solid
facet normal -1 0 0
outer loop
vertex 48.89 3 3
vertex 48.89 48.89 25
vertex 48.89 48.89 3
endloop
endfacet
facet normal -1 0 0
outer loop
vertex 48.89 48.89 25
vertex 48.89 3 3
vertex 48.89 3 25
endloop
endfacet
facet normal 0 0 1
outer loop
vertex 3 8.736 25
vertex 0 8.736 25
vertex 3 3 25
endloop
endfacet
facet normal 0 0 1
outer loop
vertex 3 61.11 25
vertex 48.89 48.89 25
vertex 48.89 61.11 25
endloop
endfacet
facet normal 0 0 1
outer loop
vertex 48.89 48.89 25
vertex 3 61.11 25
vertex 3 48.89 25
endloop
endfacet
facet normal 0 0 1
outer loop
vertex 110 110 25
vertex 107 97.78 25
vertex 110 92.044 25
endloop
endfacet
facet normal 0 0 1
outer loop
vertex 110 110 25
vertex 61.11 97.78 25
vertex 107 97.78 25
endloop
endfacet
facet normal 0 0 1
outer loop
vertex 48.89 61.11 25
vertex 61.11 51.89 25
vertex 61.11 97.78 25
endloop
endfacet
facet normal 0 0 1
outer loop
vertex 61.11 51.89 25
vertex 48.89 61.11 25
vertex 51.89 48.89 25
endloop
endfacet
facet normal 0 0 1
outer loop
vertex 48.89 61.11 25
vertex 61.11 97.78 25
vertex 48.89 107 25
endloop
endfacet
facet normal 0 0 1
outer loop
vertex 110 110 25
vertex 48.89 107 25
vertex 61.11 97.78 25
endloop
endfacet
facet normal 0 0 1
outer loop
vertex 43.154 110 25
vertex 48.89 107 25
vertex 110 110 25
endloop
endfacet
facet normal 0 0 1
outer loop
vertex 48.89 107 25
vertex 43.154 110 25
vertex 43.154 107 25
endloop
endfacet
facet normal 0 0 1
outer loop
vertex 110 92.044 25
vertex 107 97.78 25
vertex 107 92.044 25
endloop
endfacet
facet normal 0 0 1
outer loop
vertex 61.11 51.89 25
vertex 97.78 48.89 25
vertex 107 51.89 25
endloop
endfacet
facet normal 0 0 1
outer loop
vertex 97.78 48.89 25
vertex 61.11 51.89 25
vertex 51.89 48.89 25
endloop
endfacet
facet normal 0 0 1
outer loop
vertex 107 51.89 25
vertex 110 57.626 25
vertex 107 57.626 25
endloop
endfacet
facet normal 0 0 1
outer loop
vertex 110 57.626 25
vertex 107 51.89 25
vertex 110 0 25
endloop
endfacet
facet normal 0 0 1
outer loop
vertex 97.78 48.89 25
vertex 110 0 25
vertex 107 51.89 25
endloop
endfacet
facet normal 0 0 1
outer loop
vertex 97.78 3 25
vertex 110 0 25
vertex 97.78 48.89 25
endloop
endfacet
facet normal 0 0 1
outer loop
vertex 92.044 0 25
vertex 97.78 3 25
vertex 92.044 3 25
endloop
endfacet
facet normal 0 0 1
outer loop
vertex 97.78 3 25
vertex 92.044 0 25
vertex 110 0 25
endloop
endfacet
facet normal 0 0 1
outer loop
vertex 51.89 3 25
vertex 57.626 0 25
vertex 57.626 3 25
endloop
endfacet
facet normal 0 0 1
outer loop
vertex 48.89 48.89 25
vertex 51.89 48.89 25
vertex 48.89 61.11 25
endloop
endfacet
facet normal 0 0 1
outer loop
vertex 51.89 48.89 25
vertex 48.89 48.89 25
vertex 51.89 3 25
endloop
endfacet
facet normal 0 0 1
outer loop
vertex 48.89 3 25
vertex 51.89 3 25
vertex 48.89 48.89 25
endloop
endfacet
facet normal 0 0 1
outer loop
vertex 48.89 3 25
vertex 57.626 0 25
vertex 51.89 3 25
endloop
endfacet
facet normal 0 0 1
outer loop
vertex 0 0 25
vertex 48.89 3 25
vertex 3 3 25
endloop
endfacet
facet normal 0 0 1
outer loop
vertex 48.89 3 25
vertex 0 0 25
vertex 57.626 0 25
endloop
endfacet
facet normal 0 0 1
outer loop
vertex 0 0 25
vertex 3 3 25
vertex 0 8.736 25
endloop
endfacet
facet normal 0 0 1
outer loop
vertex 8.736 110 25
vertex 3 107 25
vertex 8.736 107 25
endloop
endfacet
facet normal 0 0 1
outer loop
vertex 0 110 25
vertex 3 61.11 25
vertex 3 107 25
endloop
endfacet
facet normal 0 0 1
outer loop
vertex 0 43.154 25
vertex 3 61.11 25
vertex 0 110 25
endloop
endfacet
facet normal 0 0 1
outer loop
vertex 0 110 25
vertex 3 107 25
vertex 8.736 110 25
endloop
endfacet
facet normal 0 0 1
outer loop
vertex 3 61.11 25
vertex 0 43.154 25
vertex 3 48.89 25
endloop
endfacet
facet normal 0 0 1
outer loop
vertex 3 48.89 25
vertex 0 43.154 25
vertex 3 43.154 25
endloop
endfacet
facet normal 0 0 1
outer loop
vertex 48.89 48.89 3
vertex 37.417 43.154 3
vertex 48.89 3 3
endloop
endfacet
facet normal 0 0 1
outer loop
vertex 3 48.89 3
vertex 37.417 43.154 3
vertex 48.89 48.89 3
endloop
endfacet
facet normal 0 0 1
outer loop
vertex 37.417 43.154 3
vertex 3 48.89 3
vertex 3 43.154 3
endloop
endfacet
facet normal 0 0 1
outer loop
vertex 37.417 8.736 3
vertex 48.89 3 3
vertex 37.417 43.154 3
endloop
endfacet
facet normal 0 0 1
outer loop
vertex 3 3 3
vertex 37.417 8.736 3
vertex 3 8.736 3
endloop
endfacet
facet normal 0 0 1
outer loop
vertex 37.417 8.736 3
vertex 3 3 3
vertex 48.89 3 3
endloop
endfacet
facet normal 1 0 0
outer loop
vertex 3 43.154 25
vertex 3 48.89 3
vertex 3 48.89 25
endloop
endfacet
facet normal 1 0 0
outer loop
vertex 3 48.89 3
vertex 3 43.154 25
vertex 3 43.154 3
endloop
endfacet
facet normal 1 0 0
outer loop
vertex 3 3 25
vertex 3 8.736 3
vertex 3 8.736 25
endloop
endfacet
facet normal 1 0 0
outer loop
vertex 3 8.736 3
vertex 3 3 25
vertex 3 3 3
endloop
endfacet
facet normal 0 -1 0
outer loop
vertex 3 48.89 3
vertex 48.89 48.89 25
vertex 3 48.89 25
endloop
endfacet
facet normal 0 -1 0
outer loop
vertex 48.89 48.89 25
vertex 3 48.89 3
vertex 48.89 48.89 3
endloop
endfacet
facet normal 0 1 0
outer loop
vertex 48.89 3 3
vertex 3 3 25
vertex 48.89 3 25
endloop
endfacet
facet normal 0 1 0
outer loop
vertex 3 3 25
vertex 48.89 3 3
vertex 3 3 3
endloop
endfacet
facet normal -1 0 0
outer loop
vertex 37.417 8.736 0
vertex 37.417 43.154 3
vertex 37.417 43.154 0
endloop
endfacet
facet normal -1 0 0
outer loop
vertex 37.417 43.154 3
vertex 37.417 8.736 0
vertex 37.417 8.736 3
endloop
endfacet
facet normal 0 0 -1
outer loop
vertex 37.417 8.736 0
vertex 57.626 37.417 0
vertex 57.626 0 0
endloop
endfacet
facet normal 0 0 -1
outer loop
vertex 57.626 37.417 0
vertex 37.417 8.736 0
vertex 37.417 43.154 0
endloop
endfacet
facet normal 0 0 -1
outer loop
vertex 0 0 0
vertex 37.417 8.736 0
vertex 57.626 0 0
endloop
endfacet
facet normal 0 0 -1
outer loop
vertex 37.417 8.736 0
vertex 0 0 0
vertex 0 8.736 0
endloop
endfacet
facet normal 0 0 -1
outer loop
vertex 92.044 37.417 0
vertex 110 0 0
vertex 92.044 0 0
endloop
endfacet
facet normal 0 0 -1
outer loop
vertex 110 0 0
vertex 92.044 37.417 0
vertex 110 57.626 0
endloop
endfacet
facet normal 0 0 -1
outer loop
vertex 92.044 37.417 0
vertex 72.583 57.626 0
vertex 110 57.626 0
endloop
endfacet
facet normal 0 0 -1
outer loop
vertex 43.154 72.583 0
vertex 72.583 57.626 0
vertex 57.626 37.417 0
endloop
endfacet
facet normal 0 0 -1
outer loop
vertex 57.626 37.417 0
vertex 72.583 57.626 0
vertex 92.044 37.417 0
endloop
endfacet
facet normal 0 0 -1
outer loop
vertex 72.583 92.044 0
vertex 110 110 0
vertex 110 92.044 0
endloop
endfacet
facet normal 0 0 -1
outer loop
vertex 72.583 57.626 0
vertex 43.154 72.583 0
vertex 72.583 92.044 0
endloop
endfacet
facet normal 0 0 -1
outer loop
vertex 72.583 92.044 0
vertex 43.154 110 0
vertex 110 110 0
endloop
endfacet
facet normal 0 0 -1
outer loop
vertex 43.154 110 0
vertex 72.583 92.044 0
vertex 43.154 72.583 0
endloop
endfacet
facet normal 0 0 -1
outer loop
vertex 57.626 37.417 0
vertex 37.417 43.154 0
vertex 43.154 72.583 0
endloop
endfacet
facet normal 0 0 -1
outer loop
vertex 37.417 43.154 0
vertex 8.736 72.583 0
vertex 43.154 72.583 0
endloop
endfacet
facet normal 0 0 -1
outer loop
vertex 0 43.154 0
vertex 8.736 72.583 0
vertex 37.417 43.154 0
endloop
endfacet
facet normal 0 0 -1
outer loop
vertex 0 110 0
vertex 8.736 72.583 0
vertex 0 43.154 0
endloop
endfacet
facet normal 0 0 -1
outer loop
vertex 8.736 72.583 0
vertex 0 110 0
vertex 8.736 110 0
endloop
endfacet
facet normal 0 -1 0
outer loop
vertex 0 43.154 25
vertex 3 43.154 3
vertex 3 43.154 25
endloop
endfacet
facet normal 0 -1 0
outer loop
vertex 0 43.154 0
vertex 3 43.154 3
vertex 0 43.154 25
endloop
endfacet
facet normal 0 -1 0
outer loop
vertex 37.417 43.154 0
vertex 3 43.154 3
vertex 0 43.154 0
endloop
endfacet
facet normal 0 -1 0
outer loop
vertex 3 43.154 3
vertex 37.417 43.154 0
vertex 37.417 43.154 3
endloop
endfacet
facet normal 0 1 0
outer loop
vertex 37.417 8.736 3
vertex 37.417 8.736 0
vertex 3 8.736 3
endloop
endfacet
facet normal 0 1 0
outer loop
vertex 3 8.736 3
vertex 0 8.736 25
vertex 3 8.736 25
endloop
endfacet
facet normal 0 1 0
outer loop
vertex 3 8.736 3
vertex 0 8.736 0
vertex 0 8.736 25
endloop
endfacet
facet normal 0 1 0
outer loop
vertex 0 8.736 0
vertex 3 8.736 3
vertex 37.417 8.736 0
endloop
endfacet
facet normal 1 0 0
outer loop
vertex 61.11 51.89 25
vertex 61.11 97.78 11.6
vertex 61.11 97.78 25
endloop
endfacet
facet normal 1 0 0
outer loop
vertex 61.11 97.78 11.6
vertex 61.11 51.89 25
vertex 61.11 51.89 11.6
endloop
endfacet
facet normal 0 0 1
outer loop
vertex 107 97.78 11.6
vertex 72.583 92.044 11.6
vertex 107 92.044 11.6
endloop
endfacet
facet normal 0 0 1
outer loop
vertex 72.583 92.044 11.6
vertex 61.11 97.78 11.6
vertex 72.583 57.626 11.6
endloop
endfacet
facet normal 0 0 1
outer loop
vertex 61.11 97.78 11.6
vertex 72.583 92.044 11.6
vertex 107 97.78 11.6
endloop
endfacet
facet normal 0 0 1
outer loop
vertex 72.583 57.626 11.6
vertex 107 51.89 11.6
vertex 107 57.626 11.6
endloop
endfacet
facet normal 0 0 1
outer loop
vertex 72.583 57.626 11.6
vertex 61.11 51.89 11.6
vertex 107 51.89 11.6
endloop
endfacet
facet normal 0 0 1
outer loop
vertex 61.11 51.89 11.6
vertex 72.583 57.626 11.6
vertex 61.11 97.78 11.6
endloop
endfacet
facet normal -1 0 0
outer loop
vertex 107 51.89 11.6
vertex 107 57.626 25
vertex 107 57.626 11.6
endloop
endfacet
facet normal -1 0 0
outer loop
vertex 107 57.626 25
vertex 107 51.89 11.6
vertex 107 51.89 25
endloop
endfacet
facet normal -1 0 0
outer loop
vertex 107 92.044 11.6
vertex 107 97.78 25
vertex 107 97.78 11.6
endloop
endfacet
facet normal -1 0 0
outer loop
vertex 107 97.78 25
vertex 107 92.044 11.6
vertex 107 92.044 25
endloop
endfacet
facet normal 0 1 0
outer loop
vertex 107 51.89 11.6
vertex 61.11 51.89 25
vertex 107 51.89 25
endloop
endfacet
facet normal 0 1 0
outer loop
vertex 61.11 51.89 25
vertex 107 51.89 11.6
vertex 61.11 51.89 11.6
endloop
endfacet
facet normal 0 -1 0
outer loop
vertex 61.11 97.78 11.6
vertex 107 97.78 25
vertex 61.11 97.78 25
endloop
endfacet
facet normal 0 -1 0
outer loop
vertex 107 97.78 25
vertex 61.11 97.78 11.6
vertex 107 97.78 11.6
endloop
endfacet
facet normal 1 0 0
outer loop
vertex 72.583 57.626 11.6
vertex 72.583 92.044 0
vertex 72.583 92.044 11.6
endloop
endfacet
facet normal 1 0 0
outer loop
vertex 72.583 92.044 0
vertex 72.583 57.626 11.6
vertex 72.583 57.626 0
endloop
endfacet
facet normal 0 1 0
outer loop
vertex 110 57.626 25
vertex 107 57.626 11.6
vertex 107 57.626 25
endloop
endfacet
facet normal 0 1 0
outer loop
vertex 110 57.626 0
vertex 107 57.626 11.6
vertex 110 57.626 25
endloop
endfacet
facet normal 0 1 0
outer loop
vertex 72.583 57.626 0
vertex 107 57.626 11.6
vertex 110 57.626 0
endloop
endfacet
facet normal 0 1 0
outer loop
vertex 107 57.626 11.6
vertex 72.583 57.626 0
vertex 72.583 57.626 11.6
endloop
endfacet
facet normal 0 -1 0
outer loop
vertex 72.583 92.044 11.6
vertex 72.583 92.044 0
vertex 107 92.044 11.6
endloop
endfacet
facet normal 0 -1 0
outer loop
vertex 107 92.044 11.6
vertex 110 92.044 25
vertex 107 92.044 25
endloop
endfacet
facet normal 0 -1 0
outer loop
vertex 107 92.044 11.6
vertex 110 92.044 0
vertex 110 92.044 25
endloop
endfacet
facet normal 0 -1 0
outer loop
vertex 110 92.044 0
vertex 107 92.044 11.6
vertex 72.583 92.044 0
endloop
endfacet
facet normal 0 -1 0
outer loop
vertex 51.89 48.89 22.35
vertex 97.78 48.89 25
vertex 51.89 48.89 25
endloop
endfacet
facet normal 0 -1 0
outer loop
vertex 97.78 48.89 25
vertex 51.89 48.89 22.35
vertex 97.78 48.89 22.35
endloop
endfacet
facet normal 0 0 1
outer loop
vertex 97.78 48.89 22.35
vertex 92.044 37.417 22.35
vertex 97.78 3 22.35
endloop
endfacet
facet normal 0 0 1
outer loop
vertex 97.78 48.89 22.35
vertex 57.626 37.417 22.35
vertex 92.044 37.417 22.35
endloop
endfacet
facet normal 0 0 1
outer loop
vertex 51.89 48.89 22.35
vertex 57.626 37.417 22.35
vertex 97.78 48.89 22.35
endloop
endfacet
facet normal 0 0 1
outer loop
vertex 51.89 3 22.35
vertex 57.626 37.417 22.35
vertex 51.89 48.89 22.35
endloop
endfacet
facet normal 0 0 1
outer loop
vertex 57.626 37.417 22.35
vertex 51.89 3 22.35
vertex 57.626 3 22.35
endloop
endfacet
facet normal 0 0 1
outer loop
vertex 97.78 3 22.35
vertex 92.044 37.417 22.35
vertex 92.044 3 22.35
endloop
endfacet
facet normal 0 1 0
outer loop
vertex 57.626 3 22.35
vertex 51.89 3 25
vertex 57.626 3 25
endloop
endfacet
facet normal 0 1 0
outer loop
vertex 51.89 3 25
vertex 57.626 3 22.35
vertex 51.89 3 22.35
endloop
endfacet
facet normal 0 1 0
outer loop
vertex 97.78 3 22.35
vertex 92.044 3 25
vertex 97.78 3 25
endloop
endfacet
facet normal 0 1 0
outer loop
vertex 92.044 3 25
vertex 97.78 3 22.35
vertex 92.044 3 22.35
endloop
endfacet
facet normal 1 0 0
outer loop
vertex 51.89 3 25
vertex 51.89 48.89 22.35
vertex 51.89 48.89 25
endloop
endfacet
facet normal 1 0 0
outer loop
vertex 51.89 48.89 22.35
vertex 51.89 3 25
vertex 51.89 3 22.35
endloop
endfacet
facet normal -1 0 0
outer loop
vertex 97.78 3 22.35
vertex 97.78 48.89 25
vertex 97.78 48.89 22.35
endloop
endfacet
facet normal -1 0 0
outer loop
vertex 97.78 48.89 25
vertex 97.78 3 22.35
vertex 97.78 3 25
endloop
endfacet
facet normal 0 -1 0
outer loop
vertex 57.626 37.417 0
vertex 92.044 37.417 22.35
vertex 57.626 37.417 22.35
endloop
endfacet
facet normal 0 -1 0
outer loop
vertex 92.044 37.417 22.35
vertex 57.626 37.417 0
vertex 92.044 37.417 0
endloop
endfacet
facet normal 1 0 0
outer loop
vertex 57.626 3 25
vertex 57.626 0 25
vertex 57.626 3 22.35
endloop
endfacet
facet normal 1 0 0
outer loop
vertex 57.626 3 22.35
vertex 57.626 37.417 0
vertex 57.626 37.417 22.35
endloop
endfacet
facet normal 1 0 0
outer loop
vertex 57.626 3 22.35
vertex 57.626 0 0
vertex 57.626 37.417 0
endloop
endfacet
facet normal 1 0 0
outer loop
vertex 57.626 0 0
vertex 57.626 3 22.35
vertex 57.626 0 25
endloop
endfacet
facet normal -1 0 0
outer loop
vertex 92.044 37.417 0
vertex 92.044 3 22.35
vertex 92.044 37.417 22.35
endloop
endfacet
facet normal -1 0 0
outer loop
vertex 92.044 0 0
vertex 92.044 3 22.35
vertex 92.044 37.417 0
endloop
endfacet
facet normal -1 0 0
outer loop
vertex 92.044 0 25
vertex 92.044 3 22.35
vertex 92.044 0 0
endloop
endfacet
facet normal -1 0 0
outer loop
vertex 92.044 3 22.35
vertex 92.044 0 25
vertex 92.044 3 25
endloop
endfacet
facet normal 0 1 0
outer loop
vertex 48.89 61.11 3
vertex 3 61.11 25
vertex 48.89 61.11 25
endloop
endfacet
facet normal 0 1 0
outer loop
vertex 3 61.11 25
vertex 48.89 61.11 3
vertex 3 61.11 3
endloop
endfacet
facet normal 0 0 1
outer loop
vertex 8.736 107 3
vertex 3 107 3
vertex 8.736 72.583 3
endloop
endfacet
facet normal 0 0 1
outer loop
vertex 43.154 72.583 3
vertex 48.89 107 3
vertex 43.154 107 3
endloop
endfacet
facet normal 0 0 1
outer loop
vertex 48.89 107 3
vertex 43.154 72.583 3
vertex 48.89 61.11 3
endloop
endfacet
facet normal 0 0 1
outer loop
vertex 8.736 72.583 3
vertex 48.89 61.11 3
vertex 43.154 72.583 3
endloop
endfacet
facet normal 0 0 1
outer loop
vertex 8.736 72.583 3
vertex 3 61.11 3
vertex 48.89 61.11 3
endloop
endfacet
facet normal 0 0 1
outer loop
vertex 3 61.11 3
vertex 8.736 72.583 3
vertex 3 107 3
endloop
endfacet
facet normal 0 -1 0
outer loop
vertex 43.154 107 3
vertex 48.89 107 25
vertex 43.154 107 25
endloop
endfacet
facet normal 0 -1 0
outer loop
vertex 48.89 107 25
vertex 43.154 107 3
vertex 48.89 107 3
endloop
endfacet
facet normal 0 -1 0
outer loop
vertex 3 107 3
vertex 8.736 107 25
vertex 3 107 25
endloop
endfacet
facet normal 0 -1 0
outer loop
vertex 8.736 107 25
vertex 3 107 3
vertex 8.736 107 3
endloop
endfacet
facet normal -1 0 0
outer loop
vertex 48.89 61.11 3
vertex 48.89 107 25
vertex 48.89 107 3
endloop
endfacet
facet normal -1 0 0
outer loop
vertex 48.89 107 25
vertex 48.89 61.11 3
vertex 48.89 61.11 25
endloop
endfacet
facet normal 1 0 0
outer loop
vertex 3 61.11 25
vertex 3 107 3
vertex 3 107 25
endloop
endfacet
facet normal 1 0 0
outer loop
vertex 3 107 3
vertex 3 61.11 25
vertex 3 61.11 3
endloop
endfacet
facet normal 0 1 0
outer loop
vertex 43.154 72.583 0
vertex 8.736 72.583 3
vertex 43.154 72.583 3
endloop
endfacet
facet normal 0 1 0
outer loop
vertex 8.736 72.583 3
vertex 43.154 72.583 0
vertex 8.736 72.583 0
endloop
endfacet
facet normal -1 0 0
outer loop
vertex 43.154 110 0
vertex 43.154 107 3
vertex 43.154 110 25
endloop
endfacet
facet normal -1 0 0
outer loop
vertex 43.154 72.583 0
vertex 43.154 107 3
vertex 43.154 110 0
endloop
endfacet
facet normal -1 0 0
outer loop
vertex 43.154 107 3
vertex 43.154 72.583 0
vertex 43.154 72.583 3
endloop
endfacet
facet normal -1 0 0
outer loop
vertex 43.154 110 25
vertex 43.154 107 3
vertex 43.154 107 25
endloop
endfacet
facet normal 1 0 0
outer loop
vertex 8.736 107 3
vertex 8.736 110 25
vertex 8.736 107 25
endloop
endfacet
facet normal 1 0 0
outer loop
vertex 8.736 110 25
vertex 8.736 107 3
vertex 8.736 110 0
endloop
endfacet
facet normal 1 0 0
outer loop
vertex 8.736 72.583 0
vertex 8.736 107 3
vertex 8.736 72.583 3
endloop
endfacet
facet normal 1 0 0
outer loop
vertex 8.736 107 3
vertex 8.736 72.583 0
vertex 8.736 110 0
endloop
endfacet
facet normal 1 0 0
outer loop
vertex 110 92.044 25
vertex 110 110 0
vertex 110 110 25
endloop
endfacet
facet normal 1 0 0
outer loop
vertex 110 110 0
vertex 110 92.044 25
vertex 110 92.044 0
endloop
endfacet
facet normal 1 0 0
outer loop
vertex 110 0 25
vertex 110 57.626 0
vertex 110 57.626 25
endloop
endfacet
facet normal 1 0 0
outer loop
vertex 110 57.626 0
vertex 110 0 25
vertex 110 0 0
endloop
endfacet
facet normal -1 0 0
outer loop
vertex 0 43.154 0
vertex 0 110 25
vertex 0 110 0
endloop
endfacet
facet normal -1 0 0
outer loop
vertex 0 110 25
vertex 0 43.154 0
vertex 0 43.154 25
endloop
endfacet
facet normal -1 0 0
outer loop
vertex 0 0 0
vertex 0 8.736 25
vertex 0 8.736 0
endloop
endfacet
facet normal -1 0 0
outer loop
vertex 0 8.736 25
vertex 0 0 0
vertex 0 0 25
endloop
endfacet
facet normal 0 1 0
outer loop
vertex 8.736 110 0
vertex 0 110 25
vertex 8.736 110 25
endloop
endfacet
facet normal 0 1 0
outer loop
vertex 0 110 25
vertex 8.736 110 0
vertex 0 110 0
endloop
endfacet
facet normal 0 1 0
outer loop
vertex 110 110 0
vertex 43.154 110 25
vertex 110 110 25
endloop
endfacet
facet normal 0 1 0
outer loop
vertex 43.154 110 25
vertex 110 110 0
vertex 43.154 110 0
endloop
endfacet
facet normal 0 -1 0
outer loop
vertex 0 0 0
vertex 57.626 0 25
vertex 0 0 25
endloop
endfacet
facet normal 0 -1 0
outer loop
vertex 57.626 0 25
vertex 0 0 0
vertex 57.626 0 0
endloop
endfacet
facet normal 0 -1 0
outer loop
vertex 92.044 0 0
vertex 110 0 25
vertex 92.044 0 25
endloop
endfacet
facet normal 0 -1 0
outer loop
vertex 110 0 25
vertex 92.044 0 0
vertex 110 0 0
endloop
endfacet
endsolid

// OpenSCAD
// file: SquarePileLib.scad
module LeftPile(wallThickness, totalHeight, singlePileHeight, singlePileWidth, singlePileLength, pileCount){
    pileHeight = (pileCount * singlePileHeight) + .5;
    lengthOpeningSize = singlePileLength * .75;
    widthOpeningSize = singlePileWidth * .75;
    blockerSize = (singlePileWidth - widthOpeningSize) / 2;
    
    translate([wallThickness, wallThickness, totalHeight - pileHeight])
        cube([singlePileLength, singlePileWidth, pileHeight]);
    translate([-.00001, wallThickness + (blockerSize), 0])
        cube([wallThickness + lengthOpeningSize, widthOpeningSize, totalHeight]);
}

module RightPile(wallThickness, totalHeight, singlePileHeight, singlePileWidth, singlePileLength, pileCount){
    translate([0, wallThickness + wallThickness + singlePileWidth, 0])
        rotate([0, 0, 180])
            LeftPile(wallThickness, totalHeight, singlePileHeight, singlePileWidth, singlePileLength, pileCount);
}

module BottomPile(wallThickness, totalHeight, singlePileHeight, singlePileWidth, singlePileLength, pileCount){
    translate([wallThickness + wallThickness + singlePileWidth, 0, 0])
        rotate([0, 0, 90])
            LeftPile(wallThickness, totalHeight, singlePileHeight, singlePileWidth, singlePileLength, pileCount);
}

module TopPile(wallThickness, totalHeight, singlePileHeight, singlePileWidth, singlePileLength, pileCount){
        rotate([0, 0, 270])
            LeftPile(wallThickness, totalHeight, singlePileHeight, singlePileWidth, singlePileLength, pileCount);
}
// file: ColonistsStorageFacilityLib.scad
include<SquarePileLib.scad>
//25.82 by 32.82 by 2.15
singleStorageFacilityPileHeight = 2.15;
singleStorageFacilityPileWidth = 45.19 + .7;
singleStorageFacilityPileLength = 45.19 + .7;

module LeftStorageFacilityPile(wallThickness, totalHeight, storageFacilityPileCount){
    LeftPile(
        wallThickness,
        totalHeight,
        singleStorageFacilityPileHeight,
        singleStorageFacilityPileWidth,
        singleStorageFacilityPileLength,
        storageFacilityPileCount);
}

module RightStorageFacilityPile(wallThickness, totalHeight, storageFacilityPileCount){
    RightPile(
        wallThickness,
        totalHeight,
        singleStorageFacilityPileHeight,
        singleStorageFacilityPileWidth,
        singleStorageFacilityPileLength,
        storageFacilityPileCount);
}

module BottomStorageFacilityPile(wallThickness, totalHeight, storageFacilityPileCount){
    BottomPile(
        wallThickness,
        totalHeight,
        singleStorageFacilityPileHeight,
        singleStorageFacilityPileWidth,
        singleStorageFacilityPileLength,
        storageFacilityPileCount);
}

module TopStorageFacilityPile(wallThickness, totalHeight, storageFacilityPileCount){
    TopPile(
        wallThickness,
        totalHeight,
        singleStorageFacilityPileHeight,
        singleStorageFacilityPileWidth,
        singleStorageFacilityPileLength,
        storageFacilityPileCount);
}

function storageFacilityPileHeight(storageFacilityPileCount) =
    (storageFacilityPileCount * singleStorageFacilityPileHeight) + .5;
// main file
include<ColonistsStorageFacilityLib.scad>
difference() {
    testBoxHeight = storageFacilityPileHeight(10) + 3;
    testBoxLength = 110;
    testBoxWidth = 110;
    wallThickness = 3;
    
    cube([testBoxLength, testBoxWidth, testBoxHeight]);
    LeftStorageFacilityPile(wallThickness, testBoxHeight, 10);
    translate([testBoxLength, singleStorageFacilityPileLength + wallThickness, 0])
        RightStorageFacilityPile(wallThickness, testBoxHeight, 6);
    translate([singleStorageFacilityPileLength + wallThickness, 0, 0])
        BottomStorageFacilityPile(wallThickness, testBoxHeight, 1);
    translate([0, testBoxWidth, 0])
        TopStorageFacilityPile(wallThickness, testBoxHeight, 10);
}
